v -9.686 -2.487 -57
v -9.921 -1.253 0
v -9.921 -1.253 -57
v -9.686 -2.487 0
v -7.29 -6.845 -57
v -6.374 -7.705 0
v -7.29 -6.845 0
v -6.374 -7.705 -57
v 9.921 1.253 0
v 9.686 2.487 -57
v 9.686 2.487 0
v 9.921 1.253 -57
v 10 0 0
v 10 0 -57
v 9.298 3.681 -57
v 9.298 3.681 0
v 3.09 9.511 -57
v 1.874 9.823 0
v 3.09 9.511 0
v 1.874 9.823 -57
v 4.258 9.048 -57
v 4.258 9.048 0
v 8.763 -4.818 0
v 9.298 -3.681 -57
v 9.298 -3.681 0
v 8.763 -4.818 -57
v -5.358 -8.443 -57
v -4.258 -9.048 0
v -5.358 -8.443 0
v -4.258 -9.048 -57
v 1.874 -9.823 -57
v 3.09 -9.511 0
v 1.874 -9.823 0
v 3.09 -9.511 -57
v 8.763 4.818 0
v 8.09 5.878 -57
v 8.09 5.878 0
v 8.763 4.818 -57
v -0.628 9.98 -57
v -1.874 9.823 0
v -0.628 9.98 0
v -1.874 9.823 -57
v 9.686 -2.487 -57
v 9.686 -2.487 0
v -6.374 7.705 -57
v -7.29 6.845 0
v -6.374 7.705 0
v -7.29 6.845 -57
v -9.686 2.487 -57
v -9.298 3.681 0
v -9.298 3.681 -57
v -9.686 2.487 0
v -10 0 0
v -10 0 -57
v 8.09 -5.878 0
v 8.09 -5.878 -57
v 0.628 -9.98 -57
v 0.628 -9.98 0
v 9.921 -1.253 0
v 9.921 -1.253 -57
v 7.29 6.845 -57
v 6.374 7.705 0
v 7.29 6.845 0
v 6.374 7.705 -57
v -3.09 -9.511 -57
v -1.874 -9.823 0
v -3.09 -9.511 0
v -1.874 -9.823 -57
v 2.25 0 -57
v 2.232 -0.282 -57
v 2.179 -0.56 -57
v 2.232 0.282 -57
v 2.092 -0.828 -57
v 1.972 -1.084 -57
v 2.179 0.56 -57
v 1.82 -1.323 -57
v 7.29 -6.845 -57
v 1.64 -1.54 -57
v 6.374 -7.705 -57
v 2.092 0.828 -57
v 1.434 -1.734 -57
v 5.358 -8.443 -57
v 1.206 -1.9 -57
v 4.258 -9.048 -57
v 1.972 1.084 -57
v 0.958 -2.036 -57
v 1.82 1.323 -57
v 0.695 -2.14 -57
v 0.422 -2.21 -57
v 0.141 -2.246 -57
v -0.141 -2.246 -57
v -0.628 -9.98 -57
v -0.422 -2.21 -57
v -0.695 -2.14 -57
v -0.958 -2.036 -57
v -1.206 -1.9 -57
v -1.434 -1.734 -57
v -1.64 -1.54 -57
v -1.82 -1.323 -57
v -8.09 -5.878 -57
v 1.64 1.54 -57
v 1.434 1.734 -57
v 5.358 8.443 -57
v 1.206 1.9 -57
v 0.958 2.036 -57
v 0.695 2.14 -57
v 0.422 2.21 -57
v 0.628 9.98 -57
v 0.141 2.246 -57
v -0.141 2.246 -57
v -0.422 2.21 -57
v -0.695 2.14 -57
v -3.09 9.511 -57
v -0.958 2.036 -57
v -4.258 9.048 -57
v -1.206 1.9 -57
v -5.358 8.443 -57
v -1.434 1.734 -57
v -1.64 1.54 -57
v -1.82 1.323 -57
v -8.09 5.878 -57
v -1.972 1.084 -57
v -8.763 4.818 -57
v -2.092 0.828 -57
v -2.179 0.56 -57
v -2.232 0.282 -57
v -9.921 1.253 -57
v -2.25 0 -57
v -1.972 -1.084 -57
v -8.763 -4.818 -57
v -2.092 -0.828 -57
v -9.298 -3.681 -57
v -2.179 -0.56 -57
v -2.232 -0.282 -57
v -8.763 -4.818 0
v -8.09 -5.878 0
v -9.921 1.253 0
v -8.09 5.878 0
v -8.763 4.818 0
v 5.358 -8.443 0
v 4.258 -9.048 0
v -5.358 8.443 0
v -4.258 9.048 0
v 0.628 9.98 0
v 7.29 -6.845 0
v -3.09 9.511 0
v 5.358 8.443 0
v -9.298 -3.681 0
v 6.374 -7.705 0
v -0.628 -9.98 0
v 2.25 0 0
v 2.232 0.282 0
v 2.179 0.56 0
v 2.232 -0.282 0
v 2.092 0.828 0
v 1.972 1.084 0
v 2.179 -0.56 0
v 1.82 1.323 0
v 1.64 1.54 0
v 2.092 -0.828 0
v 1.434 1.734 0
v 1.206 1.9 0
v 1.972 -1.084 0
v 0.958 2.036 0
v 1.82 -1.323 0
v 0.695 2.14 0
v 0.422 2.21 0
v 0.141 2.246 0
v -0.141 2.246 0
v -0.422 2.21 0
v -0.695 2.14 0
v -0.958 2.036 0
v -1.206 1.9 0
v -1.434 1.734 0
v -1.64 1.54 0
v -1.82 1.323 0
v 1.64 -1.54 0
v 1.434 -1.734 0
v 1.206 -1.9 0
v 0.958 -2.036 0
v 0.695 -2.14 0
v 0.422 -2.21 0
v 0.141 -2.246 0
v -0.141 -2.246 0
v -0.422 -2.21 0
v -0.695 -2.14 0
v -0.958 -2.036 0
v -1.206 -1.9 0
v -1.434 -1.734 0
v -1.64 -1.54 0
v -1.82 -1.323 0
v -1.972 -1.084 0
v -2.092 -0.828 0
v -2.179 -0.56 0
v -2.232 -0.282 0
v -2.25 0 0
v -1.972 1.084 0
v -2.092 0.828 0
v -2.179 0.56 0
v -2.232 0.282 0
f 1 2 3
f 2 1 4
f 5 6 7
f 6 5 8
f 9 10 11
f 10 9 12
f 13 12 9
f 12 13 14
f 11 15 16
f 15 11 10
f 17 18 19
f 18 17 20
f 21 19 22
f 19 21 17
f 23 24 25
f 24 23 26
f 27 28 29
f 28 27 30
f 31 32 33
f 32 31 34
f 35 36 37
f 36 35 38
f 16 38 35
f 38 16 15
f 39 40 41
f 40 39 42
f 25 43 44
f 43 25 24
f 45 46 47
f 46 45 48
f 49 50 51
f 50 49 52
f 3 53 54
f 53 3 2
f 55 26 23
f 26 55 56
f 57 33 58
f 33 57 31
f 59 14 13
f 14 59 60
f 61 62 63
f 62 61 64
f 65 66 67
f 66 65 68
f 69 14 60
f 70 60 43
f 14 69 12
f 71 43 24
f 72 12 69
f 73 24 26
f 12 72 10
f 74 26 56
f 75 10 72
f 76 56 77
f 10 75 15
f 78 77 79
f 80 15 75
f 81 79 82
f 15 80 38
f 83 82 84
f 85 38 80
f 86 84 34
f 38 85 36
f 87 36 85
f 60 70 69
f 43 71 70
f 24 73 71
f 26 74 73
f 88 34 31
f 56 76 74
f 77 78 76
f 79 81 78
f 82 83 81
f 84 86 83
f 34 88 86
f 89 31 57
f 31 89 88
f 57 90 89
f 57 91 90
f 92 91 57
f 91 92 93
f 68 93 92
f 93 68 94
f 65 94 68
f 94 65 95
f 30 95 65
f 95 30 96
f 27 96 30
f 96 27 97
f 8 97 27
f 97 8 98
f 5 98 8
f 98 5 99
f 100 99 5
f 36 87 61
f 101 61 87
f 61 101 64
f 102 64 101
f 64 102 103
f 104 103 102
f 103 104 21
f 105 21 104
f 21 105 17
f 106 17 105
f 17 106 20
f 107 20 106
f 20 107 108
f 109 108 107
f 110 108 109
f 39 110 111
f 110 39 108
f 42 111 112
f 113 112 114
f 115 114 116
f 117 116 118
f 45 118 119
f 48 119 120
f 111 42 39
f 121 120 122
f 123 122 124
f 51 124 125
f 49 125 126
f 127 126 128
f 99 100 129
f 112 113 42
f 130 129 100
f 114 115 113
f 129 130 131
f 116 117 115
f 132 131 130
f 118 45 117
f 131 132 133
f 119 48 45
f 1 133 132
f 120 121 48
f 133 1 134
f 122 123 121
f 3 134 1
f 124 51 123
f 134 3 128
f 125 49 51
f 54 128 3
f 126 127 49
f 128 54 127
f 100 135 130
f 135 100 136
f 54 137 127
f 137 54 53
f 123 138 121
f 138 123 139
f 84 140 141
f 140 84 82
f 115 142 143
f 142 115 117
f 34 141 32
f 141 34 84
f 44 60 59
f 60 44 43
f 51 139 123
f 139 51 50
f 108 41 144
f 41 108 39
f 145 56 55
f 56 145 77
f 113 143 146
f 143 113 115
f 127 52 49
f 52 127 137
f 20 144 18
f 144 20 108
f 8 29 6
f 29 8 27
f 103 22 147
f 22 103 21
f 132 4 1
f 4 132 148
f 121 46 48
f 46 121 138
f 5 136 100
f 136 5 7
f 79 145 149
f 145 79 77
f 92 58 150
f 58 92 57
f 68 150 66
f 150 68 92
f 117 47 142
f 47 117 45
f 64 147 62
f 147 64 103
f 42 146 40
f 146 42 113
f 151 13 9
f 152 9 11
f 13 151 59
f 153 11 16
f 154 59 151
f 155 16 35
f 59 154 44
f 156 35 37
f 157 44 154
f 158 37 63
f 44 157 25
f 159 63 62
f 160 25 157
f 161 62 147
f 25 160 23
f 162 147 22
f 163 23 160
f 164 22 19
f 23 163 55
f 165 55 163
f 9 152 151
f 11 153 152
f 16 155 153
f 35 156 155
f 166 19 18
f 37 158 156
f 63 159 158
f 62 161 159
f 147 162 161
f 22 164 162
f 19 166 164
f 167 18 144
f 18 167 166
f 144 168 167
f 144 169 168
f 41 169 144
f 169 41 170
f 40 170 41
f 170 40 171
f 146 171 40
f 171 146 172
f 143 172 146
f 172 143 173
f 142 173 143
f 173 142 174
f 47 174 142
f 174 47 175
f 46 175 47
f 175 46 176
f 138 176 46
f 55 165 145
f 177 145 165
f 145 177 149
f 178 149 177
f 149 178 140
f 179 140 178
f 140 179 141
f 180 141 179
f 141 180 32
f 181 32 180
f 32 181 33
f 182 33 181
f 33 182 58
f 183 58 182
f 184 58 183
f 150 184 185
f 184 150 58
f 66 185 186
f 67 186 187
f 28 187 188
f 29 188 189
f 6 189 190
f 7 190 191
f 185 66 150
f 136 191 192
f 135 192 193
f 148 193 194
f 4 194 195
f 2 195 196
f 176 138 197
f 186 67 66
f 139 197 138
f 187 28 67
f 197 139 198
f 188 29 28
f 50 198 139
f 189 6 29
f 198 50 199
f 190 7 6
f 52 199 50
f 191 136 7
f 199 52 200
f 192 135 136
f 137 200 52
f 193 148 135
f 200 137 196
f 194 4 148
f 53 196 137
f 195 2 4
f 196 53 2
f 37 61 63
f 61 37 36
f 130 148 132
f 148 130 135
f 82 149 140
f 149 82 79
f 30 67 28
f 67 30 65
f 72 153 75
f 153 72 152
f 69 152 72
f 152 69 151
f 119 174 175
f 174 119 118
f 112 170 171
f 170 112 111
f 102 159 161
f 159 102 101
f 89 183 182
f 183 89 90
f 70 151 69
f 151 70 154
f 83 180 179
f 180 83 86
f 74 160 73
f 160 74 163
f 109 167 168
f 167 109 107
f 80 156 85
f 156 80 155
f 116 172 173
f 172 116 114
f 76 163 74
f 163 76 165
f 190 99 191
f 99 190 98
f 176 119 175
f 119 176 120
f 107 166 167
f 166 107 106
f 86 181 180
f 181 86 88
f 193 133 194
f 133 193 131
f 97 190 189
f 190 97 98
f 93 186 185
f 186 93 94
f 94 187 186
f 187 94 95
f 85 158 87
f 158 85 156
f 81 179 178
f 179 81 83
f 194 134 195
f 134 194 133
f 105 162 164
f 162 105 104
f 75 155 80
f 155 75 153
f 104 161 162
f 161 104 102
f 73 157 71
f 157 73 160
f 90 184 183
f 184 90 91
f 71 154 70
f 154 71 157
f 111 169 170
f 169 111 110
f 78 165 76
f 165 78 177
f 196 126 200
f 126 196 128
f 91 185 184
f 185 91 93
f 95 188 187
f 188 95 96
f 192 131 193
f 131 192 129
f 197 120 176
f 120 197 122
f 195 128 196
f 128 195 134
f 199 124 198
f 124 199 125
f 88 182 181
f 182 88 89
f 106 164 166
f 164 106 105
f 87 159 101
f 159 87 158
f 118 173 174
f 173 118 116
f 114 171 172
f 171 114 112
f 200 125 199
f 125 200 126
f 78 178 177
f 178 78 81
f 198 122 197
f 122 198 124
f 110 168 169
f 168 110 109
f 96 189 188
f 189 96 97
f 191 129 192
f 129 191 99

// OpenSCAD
$fn = 50;


difference() {
	union() {
		translate(v = [0, 0, -57.0000000000]) {
			cylinder(h = 57, r = 10.0000000000);
		}
		cylinder(h = 0, r = 13.0000000000);
	}
	union() {
		#translate(v = [0, 0, -57]) {
			cylinder(h = 57, r = 2.2500000000);
		}
	}
}
